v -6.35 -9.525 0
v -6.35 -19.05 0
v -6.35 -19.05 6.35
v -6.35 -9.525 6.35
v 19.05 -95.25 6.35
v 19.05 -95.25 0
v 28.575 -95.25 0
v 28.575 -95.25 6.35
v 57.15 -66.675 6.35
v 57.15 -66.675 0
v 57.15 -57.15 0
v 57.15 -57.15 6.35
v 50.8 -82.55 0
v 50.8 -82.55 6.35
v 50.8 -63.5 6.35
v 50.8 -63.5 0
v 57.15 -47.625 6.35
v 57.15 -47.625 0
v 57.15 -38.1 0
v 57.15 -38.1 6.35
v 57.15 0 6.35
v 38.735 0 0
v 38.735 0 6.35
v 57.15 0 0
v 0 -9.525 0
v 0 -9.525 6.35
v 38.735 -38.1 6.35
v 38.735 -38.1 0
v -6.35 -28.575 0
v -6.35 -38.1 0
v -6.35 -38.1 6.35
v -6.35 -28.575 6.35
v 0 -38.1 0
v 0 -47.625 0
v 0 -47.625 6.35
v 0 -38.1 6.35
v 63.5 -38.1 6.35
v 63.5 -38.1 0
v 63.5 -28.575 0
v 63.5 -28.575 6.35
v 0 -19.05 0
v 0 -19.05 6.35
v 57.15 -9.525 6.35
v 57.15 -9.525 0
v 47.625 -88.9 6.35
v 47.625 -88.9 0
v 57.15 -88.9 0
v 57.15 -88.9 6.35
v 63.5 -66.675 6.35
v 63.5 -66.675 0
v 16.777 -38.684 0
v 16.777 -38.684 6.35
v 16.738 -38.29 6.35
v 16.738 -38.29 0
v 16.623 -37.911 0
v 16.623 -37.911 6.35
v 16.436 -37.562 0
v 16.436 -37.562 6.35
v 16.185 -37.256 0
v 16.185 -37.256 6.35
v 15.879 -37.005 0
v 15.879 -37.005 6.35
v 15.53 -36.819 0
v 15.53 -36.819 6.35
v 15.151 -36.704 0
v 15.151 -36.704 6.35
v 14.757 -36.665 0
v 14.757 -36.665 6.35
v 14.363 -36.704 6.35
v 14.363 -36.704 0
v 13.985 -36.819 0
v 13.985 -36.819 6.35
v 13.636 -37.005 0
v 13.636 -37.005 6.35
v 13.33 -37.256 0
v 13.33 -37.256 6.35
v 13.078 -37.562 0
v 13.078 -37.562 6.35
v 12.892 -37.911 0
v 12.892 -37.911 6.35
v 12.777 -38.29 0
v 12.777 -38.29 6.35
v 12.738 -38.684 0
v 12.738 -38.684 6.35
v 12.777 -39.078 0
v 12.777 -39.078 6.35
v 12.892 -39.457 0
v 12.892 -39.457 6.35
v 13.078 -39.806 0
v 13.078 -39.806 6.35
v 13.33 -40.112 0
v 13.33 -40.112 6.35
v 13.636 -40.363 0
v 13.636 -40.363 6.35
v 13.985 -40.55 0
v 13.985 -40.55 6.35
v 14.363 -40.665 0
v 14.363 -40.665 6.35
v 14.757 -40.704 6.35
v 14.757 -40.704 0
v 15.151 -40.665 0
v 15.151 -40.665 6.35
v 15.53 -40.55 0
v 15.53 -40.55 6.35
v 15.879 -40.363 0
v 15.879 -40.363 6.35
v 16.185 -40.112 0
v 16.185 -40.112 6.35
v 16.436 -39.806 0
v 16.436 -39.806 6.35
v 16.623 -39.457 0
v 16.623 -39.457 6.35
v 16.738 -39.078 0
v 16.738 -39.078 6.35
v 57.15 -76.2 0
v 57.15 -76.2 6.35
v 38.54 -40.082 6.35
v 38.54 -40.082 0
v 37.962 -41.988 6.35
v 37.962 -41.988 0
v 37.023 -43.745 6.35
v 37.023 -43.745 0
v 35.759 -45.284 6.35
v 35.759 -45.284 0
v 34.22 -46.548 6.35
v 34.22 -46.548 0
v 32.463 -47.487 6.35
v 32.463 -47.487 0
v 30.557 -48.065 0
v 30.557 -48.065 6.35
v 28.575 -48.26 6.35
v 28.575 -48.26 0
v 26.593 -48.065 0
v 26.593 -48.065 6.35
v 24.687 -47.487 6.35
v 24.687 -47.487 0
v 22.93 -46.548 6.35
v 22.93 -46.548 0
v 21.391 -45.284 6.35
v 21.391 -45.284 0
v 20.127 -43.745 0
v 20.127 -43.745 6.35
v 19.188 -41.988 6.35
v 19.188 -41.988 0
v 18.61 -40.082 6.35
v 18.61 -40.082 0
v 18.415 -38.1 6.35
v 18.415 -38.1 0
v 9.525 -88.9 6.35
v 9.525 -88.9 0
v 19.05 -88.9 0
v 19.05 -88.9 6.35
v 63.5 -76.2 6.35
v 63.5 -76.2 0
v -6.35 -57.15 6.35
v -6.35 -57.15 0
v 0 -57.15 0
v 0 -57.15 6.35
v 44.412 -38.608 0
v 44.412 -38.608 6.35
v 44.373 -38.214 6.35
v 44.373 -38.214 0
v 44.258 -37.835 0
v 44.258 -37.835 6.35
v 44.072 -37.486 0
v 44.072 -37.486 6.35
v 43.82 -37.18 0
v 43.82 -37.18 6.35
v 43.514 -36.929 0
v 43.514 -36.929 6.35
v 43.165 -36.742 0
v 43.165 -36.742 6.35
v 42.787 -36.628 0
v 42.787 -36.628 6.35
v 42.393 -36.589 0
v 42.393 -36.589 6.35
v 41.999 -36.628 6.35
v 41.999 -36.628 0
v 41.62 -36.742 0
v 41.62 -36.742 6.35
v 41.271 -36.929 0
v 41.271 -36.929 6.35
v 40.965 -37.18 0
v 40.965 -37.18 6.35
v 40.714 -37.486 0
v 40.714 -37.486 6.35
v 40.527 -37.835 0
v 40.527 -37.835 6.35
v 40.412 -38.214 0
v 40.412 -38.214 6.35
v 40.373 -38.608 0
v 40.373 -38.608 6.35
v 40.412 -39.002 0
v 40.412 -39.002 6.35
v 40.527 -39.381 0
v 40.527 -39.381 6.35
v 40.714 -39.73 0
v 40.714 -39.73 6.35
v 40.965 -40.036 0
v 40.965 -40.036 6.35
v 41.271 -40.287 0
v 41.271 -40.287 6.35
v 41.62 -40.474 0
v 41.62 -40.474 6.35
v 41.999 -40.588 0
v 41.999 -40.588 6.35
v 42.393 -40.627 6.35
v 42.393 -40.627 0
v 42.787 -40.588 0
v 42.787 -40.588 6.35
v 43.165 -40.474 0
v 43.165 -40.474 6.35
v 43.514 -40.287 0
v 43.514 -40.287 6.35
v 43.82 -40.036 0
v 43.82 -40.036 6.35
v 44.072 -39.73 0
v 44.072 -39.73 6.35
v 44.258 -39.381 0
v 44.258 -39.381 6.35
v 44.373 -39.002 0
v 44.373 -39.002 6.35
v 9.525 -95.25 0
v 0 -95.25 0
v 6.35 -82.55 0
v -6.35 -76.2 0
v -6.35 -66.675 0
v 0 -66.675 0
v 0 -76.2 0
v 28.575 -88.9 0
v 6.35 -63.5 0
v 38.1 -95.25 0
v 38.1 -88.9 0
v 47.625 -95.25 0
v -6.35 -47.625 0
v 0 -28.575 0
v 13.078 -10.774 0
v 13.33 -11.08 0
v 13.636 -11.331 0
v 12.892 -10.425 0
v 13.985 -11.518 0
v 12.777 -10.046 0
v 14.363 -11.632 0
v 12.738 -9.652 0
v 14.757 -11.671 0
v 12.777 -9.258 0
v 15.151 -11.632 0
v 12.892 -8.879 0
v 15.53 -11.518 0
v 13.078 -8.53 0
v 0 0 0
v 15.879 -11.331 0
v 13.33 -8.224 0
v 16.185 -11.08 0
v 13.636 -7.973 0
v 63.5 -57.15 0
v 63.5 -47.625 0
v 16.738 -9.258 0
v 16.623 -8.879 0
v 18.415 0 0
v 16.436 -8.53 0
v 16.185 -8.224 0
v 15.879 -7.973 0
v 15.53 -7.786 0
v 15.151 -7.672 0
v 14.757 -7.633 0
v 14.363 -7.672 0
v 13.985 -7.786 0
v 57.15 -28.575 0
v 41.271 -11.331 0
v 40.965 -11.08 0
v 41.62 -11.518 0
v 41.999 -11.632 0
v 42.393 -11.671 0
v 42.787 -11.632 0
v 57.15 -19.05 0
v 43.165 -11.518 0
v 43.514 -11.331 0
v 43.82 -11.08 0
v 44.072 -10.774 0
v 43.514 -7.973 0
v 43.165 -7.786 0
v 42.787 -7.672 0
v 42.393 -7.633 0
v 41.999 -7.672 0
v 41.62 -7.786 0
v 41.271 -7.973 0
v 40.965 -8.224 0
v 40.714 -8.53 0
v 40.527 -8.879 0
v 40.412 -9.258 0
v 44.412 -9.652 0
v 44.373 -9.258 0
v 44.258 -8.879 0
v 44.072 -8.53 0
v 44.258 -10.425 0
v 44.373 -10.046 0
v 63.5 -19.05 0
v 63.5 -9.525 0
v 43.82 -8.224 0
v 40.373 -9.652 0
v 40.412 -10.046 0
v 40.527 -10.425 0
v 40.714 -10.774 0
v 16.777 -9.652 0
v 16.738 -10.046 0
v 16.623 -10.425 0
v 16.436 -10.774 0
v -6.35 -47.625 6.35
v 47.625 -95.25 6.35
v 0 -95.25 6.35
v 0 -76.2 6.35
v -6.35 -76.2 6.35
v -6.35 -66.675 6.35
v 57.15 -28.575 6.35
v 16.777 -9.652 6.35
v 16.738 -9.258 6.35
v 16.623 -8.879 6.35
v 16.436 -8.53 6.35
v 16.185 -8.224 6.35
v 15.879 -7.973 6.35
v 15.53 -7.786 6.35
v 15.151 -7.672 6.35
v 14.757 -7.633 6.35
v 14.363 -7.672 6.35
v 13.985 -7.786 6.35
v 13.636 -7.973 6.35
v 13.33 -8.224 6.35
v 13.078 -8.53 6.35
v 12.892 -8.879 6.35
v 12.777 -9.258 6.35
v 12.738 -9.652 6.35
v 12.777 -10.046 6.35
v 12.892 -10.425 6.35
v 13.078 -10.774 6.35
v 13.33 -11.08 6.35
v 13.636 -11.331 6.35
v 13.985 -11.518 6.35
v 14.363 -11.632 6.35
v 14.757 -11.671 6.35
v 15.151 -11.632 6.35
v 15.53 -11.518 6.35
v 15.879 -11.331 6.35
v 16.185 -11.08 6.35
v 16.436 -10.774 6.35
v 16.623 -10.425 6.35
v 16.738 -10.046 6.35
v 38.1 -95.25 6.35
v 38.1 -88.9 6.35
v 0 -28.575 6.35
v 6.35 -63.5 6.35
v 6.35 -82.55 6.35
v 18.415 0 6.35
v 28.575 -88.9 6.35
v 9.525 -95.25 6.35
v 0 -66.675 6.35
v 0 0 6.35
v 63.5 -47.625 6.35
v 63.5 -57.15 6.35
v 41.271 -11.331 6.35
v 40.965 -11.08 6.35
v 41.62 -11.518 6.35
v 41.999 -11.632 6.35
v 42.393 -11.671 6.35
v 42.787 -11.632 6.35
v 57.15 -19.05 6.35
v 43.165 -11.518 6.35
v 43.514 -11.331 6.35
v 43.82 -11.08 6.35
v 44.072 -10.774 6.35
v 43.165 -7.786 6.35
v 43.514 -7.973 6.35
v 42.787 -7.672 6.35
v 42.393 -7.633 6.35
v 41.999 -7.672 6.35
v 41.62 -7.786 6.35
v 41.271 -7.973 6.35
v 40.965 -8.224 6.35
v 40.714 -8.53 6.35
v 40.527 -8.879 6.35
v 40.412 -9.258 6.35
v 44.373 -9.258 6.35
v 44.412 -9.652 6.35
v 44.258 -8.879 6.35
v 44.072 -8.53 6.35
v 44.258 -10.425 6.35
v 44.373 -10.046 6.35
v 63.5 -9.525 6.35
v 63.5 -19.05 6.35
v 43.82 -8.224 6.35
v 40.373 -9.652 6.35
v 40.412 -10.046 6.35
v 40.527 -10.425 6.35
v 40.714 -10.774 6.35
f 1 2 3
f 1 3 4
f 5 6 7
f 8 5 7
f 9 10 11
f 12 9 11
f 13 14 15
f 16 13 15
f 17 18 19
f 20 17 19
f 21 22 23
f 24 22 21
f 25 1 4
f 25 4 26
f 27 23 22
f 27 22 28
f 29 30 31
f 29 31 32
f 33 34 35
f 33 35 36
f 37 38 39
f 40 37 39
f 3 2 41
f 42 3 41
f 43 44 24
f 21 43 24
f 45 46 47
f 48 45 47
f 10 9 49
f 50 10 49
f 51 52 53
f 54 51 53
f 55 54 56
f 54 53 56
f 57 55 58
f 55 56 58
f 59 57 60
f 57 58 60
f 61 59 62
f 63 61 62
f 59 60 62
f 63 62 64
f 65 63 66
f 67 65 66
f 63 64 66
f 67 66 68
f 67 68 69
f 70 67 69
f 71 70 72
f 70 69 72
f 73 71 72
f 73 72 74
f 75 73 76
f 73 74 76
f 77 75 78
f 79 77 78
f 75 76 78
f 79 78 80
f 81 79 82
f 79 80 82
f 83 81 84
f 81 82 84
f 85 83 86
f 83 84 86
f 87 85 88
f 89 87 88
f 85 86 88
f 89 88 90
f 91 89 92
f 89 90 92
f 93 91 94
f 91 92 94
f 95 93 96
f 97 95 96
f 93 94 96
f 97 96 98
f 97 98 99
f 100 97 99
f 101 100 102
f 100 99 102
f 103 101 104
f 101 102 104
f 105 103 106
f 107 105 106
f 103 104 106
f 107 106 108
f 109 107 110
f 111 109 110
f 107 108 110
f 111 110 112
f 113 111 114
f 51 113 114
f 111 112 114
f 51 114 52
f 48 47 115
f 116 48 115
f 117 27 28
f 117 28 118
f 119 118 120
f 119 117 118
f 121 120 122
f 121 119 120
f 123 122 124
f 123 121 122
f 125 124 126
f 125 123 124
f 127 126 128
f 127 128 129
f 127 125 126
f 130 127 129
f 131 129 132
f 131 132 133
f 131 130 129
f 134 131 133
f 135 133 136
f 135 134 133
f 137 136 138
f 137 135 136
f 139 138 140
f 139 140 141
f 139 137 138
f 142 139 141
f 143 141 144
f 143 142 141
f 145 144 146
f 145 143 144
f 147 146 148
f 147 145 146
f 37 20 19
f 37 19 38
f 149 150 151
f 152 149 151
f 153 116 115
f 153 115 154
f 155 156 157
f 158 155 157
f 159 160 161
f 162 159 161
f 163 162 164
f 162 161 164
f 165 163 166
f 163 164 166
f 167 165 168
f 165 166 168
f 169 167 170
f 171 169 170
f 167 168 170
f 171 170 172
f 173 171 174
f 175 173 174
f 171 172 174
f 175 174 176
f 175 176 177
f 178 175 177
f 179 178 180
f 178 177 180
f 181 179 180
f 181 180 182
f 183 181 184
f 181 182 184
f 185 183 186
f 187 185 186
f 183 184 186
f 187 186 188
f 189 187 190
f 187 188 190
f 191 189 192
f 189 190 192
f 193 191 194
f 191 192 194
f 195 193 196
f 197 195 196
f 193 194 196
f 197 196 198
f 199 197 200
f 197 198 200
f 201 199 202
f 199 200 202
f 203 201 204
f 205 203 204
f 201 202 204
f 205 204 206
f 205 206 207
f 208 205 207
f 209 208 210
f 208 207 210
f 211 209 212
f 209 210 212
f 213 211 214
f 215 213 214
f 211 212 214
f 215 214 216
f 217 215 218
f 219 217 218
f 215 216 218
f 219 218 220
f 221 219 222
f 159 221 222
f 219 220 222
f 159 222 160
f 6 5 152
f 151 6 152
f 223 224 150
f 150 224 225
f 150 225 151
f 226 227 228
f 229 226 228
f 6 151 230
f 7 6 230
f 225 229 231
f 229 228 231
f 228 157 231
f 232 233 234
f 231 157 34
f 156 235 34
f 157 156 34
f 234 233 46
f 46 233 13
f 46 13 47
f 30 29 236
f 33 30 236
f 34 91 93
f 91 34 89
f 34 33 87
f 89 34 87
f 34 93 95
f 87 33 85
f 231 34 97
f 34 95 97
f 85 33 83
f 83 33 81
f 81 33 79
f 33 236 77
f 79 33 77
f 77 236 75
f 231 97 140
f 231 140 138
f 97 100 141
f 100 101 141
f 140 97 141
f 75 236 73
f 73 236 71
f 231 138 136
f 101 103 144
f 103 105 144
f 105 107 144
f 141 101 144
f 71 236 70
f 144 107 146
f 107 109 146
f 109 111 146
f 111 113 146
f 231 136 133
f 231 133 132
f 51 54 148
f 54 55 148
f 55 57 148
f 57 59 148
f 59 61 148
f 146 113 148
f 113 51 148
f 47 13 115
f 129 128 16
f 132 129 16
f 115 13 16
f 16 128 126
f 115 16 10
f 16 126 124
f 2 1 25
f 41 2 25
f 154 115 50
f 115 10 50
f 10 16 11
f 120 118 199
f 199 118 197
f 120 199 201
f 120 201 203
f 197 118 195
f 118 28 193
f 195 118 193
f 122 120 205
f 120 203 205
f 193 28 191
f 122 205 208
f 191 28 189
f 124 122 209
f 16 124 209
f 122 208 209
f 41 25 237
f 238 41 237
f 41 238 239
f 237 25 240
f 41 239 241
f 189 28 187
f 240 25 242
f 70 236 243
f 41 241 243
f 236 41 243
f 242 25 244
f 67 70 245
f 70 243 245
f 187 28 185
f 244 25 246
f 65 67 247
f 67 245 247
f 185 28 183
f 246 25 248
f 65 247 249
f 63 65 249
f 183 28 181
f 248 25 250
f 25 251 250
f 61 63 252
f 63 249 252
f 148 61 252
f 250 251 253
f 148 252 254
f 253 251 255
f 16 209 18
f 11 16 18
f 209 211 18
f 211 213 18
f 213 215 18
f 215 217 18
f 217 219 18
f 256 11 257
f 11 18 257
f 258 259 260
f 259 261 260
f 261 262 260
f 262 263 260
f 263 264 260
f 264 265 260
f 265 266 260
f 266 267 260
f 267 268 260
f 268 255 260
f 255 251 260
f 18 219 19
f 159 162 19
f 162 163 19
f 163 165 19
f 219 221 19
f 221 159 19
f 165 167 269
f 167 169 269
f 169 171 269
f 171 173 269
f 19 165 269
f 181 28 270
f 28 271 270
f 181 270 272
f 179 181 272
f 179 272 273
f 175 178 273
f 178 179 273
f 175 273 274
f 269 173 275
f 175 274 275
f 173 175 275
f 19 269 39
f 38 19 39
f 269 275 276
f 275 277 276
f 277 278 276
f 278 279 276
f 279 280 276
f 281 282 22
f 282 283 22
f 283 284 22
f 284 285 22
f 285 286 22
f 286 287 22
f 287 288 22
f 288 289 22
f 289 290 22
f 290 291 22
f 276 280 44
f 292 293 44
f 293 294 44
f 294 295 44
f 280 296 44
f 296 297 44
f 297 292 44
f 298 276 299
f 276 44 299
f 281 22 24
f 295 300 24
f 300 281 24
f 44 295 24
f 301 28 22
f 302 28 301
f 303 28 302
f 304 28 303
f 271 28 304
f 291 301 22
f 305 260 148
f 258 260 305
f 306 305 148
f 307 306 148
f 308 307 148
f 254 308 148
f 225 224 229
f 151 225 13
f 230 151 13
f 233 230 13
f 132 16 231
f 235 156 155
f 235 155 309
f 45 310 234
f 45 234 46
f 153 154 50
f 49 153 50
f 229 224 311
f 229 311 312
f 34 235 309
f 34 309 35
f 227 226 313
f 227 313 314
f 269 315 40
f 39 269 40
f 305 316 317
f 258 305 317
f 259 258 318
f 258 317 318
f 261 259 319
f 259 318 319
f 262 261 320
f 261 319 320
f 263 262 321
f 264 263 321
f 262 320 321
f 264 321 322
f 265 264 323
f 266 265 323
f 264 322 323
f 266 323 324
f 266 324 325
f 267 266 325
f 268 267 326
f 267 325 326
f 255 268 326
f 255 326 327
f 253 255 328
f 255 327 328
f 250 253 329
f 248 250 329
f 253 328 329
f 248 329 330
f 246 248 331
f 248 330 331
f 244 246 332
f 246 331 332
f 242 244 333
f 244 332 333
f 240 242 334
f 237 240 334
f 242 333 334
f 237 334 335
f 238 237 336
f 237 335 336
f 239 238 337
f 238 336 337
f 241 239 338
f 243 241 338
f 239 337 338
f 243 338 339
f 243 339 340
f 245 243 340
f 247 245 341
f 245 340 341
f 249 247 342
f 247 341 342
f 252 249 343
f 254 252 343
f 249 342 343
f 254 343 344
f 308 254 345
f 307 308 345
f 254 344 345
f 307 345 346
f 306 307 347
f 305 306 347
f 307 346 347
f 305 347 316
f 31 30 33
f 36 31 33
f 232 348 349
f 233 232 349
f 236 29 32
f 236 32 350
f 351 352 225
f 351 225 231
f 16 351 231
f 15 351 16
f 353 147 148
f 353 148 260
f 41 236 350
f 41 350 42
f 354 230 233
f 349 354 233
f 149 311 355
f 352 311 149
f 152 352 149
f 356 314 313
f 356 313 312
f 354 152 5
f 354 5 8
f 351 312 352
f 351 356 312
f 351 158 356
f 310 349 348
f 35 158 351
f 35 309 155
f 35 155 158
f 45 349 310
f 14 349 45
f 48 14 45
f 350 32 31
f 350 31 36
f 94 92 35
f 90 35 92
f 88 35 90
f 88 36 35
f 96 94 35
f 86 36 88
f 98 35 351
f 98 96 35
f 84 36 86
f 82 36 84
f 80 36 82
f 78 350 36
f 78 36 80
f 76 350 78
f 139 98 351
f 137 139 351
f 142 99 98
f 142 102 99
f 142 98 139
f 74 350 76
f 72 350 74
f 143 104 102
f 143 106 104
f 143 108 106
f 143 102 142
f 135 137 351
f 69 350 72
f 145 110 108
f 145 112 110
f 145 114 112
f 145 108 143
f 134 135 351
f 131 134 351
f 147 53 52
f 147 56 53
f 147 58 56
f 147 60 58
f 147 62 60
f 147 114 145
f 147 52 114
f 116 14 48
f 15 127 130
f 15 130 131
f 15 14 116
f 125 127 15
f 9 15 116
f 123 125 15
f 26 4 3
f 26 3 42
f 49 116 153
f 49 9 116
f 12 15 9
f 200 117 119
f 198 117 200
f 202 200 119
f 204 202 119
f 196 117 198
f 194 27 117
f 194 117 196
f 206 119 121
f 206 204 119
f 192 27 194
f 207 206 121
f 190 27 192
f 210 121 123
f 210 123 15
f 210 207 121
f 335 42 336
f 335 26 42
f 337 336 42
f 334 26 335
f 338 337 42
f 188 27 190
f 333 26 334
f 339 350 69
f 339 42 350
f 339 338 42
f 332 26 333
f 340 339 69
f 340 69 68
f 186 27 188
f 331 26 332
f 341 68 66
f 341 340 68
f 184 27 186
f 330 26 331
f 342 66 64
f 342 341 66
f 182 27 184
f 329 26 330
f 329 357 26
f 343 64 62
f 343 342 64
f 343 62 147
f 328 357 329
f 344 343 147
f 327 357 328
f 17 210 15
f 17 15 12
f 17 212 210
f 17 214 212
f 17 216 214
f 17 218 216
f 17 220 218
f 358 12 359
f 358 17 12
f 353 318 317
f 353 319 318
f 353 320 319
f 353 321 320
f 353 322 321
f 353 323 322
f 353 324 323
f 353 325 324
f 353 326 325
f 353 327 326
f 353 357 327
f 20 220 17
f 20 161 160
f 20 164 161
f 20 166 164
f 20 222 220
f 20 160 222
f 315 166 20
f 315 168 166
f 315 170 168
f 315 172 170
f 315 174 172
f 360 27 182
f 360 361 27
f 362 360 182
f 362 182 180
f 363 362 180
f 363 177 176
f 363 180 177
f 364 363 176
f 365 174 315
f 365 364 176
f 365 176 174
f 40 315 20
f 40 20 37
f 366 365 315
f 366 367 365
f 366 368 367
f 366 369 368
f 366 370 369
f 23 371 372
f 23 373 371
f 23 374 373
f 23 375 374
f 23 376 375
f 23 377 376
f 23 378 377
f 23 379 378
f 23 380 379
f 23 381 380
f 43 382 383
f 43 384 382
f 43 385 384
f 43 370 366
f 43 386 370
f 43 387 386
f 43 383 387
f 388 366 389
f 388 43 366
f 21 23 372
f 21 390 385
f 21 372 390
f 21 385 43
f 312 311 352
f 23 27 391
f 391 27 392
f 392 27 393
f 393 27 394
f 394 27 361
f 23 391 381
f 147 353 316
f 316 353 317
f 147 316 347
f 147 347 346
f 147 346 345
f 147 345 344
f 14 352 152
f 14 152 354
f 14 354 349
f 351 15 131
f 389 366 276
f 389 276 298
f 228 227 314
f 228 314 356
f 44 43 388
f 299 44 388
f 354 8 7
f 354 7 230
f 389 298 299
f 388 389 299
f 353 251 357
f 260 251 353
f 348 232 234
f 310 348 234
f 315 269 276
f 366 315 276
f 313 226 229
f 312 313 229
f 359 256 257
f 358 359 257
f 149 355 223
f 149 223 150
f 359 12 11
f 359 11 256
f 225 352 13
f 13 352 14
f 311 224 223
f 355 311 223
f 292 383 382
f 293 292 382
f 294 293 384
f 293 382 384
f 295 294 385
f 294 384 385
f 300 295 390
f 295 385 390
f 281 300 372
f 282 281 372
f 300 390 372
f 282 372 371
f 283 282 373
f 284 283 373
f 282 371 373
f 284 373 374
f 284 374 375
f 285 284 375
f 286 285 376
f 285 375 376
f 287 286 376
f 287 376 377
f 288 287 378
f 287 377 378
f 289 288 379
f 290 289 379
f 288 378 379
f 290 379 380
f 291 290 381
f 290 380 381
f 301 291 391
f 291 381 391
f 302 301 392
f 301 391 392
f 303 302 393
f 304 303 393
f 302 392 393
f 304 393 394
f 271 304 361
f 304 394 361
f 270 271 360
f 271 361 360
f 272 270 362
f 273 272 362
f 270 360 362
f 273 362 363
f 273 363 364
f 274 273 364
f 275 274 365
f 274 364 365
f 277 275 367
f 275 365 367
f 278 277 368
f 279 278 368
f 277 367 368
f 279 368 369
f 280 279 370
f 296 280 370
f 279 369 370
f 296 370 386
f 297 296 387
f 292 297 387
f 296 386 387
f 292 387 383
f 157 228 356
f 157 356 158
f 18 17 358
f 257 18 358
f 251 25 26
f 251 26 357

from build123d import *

# Parameters (mm, degrees)
SKETCH1_W           = 57.15
SKETCH1_H           = 88.9
BOSS_EXTRUDE1_DEPTH = 6.35
SKETCH2_R           = 2.0193
SKETCH2_W           = 44.45
SKETCH2_H           = 19.05
CUT_EXTRUDE1_DEPTH  = 6.35
SKETCH3_W           = 6.35
SKETCH3_H           = 9.525
SKETCH3_W_2         = 9.525
SKETCH3_H_2         = 6.35
BOSS_EXTRUDE3_DEPTH = 6.35


with BuildPart() as part:
    # Sketch1 → Boss-Extrude1 (new body)
    with BuildSketch(Plane.XY):
        with Locations((28.575, -44.45)):
            Rectangle(SKETCH1_W, SKETCH1_H)
    extrude(amount=BOSS_EXTRUDE1_DEPTH)

    # Sketch2 → Cut-Extrude1 (cut)
    with BuildSketch(Plane.XY.offset(6.35)):
        with Locations((42.3926, -9.652)):
            Circle(SKETCH2_R)
        with Locations((42.3926, -38.608)):
            Circle(SKETCH2_R)
        with Locations((14.7574, -38.6842)):
            Circle(SKETCH2_R)
        with Locations((14.7574, -9.652)):
            Circle(SKETCH2_R)
        with BuildLine():
            Line((38.735, 0), (38.735, -38.1))
            ThreePointArc((38.735, -38.1), (28.575, -48.26), (18.415, -38.1))
            Line((18.415, -38.1), (18.415, 0))
            ThreePointArc((18.415, 0), (28.575, 10.16), (38.735, 0))
        make_face()
        with Locations((28.575, -73.025)):
            Rectangle(SKETCH2_W, SKETCH2_H)
    extrude(amount=-CUT_EXTRUDE1_DEPTH, mode=Mode.SUBTRACT)

    # Sketch3 → Boss-Extrude3 (add)
    with BuildSketch(Plane.XY):
        with Locations((-3.175, -14.2875)):
            Rectangle(SKETCH3_W, SKETCH3_H)
        with Locations((-3.175, -33.3375)):
            Rectangle(SKETCH3_W, SKETCH3_H)
        with Locations((-3.175, -52.3875)):
            Rectangle(SKETCH3_W, SKETCH3_H)
        with Locations((-3.175, -71.4375)):
            Rectangle(SKETCH3_W, SKETCH3_H)
        with Locations((4.7625, -92.075)):
            Rectangle(SKETCH3_W_2, SKETCH3_H_2)
        with Locations((60.325, -71.4375)):
            Rectangle(SKETCH3_W, SKETCH3_H)
        with Locations((60.325, -52.3875)):
            Rectangle(SKETCH3_W, SKETCH3_H)
        with Locations((60.325, -33.3375)):
            Rectangle(SKETCH3_W, SKETCH3_H)
        with Locations((60.325, -14.2875)):
            Rectangle(SKETCH3_W, SKETCH3_H)
        with Locations((23.8125, -92.075)):
            Rectangle(SKETCH3_W_2, SKETCH3_H_2)
        with Locations((42.8625, -92.075)):
            Rectangle(SKETCH3_W_2, SKETCH3_H_2)
    extrude(amount=BOSS_EXTRUDE3_DEPTH)


solid = part.part
